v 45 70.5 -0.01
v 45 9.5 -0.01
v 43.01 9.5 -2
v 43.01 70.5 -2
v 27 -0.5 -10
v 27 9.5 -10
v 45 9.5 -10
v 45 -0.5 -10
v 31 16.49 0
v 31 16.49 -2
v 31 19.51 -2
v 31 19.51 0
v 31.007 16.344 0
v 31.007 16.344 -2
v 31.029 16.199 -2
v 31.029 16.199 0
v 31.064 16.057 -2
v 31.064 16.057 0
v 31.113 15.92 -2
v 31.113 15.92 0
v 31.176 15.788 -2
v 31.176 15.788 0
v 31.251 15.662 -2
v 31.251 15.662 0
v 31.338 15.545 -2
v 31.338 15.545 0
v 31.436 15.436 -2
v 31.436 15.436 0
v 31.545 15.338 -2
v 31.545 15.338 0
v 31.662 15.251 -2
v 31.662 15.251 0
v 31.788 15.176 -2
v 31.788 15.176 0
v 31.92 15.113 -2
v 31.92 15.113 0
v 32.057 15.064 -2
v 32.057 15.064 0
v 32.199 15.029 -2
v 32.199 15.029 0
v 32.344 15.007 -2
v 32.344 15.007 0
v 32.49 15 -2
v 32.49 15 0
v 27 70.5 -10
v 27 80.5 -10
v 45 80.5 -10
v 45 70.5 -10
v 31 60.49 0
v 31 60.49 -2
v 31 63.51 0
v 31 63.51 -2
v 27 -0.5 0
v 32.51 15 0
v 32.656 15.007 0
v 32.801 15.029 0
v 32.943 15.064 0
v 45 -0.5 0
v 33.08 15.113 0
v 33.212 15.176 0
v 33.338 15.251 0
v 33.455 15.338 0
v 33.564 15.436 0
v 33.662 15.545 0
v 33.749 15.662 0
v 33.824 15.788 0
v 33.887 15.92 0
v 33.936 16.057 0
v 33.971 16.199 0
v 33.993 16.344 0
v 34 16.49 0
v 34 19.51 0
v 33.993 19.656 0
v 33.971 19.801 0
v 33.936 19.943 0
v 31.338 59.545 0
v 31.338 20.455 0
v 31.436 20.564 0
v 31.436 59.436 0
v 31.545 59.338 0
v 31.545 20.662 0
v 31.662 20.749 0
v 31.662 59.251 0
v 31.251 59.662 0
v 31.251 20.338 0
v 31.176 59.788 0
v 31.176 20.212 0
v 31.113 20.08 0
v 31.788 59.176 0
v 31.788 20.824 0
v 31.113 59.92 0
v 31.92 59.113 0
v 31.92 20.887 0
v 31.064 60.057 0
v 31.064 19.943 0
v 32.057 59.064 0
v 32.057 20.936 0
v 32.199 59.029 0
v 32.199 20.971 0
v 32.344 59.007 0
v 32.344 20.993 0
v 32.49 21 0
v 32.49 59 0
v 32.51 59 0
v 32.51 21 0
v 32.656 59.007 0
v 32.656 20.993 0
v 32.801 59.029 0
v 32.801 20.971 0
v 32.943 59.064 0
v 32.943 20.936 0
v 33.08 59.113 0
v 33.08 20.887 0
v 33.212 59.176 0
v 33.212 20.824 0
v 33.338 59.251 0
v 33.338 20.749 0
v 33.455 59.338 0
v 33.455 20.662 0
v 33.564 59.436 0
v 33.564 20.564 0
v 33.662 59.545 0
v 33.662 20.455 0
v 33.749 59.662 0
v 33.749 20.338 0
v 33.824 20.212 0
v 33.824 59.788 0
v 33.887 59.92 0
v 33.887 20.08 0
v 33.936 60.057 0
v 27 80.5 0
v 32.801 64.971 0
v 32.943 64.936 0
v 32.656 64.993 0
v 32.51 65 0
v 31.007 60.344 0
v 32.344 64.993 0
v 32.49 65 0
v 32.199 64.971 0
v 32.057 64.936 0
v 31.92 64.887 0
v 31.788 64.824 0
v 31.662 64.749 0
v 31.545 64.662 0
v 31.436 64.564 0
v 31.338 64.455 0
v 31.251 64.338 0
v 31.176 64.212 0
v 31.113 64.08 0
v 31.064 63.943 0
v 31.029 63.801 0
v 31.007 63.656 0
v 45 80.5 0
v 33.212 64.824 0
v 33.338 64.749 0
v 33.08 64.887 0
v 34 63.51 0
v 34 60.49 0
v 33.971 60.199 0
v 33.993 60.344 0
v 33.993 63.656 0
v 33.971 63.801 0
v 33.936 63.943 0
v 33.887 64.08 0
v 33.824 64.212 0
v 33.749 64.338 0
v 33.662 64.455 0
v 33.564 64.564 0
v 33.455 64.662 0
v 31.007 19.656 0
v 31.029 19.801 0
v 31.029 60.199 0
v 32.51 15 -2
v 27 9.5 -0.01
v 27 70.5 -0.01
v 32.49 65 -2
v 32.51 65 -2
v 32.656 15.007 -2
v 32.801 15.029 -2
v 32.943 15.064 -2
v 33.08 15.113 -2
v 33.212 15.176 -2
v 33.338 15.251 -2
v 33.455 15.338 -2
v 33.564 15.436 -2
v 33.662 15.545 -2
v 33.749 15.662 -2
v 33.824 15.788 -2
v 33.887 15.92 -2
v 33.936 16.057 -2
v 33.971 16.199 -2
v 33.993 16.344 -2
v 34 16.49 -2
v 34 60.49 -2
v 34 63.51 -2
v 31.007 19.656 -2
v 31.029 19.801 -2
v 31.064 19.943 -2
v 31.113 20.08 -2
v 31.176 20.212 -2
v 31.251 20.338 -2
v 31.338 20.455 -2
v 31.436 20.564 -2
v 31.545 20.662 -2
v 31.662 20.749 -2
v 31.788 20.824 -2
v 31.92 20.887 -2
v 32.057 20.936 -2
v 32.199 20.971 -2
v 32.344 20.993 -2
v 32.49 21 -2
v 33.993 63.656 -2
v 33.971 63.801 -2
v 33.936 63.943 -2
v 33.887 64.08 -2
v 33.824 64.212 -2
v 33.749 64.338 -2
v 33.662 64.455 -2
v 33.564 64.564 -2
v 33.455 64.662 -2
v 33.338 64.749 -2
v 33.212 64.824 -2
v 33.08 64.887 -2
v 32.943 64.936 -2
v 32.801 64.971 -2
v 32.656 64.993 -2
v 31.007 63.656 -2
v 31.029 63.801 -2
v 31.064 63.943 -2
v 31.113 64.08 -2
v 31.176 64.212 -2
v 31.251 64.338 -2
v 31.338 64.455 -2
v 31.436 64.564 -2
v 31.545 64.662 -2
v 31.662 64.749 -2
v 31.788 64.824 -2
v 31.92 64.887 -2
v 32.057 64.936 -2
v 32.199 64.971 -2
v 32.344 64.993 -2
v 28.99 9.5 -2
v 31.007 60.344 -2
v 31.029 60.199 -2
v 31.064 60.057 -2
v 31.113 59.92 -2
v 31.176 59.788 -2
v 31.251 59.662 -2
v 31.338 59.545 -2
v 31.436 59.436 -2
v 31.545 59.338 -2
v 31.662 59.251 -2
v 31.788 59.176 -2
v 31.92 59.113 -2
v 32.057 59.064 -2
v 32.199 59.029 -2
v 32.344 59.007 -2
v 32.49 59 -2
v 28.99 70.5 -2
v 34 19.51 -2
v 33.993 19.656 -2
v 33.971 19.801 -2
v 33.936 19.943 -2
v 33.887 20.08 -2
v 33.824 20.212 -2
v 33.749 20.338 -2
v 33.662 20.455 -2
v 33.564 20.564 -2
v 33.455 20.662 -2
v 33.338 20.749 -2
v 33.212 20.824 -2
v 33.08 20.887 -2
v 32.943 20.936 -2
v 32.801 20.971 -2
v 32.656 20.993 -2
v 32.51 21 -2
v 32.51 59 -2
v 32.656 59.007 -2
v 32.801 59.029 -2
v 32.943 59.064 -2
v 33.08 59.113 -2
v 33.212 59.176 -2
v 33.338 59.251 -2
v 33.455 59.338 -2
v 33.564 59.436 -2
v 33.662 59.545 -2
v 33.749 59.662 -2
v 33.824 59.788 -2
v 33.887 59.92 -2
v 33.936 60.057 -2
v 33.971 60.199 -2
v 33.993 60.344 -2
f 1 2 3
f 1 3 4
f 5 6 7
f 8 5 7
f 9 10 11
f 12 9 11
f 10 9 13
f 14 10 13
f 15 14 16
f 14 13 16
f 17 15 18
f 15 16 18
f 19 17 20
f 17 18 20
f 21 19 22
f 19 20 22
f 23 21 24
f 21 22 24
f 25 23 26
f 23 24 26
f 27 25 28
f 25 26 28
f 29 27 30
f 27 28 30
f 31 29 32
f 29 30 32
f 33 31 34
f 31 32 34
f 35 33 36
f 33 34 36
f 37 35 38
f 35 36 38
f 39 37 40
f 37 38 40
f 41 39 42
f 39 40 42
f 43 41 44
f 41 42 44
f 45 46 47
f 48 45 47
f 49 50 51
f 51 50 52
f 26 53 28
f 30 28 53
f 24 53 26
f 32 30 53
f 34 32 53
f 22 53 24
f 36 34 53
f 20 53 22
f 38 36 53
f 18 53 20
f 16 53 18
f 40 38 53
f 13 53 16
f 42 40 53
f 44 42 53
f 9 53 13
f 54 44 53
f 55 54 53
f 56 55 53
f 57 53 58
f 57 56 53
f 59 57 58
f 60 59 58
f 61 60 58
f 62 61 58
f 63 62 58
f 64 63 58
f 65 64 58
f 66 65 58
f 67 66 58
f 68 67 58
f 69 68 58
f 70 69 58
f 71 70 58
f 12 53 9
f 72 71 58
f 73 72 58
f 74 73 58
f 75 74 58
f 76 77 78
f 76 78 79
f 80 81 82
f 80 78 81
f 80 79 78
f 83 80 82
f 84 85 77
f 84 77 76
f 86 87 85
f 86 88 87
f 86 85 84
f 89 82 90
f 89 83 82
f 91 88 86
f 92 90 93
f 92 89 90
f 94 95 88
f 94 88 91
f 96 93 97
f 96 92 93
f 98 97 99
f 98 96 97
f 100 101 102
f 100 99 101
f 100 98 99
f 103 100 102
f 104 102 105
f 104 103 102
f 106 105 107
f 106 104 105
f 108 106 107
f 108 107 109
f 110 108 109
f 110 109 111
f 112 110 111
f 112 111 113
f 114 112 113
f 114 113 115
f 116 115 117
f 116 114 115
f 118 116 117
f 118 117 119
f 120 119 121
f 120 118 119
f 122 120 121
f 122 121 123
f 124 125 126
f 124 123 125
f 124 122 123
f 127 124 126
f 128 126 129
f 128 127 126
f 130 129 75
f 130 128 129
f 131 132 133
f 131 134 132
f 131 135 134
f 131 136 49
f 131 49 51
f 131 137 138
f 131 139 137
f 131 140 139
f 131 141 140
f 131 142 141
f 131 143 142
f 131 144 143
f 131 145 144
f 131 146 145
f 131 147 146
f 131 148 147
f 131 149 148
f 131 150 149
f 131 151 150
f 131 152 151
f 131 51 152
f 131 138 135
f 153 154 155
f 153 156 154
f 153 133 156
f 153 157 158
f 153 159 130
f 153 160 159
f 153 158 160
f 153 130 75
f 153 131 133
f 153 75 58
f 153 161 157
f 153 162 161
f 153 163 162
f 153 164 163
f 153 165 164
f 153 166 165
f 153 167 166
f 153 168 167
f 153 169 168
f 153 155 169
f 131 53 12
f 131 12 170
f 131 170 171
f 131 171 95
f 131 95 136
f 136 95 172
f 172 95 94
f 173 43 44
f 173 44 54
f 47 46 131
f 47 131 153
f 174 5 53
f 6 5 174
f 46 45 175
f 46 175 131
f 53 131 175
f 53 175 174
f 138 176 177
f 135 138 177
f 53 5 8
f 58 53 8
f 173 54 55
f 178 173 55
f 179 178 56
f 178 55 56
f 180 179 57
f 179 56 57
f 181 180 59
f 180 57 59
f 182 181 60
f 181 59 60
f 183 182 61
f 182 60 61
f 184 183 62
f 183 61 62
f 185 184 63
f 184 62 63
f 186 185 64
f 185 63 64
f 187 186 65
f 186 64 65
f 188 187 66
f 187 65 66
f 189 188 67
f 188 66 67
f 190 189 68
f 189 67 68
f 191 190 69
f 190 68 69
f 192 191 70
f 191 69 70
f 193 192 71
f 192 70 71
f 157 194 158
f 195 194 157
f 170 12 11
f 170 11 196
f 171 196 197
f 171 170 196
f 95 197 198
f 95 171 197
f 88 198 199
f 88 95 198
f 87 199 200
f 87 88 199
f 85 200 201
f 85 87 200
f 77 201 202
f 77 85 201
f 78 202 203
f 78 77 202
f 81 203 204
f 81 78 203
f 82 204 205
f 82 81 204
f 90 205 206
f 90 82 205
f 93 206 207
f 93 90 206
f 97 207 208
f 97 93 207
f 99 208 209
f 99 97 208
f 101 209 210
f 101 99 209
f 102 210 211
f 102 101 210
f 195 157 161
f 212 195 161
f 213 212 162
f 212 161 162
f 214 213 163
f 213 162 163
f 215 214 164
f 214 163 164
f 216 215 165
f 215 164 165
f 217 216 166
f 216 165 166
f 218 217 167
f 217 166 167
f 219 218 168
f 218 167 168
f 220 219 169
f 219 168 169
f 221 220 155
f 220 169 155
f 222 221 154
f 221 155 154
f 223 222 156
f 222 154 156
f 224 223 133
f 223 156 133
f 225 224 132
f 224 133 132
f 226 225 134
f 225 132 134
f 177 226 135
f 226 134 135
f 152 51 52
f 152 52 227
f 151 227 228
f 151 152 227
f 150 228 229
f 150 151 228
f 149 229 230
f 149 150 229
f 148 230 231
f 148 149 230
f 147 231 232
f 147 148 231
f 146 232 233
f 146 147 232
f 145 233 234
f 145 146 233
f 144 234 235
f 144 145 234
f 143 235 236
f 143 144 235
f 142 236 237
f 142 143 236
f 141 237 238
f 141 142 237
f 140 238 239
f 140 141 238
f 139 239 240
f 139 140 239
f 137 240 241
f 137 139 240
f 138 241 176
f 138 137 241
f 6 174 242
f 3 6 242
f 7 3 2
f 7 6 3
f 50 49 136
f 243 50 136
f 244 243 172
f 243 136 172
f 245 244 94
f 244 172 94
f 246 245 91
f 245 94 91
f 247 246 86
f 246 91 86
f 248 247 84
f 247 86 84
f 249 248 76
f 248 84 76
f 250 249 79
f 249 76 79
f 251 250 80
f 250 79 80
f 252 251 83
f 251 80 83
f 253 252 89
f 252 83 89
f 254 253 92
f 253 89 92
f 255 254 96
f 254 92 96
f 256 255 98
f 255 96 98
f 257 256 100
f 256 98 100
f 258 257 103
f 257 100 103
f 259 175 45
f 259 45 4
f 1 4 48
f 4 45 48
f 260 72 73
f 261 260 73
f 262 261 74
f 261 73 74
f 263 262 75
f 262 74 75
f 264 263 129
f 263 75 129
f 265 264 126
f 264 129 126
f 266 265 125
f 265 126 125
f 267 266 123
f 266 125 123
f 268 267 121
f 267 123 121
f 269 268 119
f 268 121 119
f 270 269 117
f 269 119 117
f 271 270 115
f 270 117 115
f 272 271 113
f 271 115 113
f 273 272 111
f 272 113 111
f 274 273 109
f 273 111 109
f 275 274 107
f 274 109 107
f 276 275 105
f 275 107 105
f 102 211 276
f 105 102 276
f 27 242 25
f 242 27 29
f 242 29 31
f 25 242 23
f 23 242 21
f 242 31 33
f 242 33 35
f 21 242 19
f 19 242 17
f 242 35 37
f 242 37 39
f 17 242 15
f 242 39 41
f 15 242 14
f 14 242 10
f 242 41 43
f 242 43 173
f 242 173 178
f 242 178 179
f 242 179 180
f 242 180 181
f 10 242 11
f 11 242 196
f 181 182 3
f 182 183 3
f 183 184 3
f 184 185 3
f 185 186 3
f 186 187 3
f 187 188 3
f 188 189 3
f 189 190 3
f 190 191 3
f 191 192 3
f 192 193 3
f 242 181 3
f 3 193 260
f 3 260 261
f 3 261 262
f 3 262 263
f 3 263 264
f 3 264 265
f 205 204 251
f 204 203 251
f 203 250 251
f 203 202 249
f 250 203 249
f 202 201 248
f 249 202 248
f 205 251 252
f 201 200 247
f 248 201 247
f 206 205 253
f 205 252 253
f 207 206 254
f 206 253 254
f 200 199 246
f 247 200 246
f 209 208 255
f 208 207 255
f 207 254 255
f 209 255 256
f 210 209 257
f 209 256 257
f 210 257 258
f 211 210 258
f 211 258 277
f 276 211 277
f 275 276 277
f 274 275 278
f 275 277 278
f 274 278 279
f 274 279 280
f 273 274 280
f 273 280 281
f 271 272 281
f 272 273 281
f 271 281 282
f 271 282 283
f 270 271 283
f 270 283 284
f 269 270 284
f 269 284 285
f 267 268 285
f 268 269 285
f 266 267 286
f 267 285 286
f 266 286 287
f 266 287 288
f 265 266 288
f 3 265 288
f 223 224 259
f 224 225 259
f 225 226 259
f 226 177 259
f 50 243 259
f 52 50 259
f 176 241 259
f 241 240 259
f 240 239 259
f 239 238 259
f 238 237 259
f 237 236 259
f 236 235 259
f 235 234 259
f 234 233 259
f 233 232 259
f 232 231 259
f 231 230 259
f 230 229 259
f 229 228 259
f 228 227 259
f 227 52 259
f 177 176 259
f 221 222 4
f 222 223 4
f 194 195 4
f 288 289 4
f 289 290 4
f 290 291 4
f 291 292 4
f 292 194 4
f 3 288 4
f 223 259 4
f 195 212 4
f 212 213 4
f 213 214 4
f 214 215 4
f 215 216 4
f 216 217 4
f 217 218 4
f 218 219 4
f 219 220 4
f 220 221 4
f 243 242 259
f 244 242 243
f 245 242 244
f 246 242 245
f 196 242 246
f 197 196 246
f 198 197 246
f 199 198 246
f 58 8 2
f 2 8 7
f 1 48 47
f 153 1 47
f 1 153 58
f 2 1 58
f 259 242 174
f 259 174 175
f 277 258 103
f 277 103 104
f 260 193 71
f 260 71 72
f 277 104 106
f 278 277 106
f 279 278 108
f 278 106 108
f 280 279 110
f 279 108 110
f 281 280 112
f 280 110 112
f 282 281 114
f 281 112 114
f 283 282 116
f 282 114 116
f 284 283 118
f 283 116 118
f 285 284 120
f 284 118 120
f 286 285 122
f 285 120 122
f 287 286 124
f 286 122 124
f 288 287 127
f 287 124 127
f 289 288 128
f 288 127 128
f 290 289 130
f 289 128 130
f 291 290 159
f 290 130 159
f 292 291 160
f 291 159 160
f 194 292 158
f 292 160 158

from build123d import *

# Parameters (mm, degrees)
BOX108_W        = 3
BOX108_H        = 6
BOX108_DEPTH    = 10
FILLET029_R     = 1.49
BOX107_W        = 3
BOX107_H        = 6
BOX107_DEPTH    = 10
FILLET028_R     = 1.49
BOX106_W        = 18
BOX106_H        = 81
BOX106_DEPTH    = 2
BOX105_W        = 18
BOX105_H        = 10
BOX105_DEPTH    = 10
BOX104_W        = 18
BOX104_H        = 10
BOX104_DEPTH    = 10
CHAMFER014_SIZE = 1.99


with BuildPart() as fillet029:
    # Box108 → Box108 (new body)
    with BuildSketch(Plane.XY):
        with Locations((1.5, 3)):
            Rectangle(BOX108_W, BOX108_H)
    extrude(amount=BOX108_DEPTH)

    # Fillet029
    fillet029_edges = [fillet029.edges().sort_by_distance(p)[0] for p in [
        (0, 0, 5),
        (0, 6, 5),
        (3, 0, 5),
        (3, 6, 5),
    ]]
    fillet(fillet029_edges, radius=FILLET029_R)


with BuildPart() as fillet029_1:
    # Fillet029 placement: moved
    add(fillet029.part.moved(Location((31, 59.5, -6))))


with BuildPart() as fusion133:
    # Box107 → Box107 (new body)
    with BuildSketch(Plane.XY):
        with Locations((1.5, 3)):
            Rectangle(BOX107_W, BOX107_H)
    extrude(amount=BOX107_DEPTH)

    # Fillet028
    fillet028_edges = [fusion133.edges().sort_by_distance(p)[0] for p in [
        (0, 0, 5),
        (0, 6, 5),
        (3, 0, 5),
        (3, 6, 5),
    ]]
    fillet(fillet028_edges, radius=FILLET028_R)


with BuildPart() as fusion133_1:
    # Fillet028 placement: moved
    add(fusion133.part.moved(Location((31, 15.5, -6))))

    # Fusion133: union Fillet029
    add(fillet029_1.part)


with BuildPart() as cube078:
    # Box106 → Box106 (new body)
    with BuildSketch(Plane(origin=(27, 0, -2), x_dir=(1, 0, 0), z_dir=(0, 0, 1))):
        with Locations((9, 40.5)):
            Rectangle(BOX106_W, BOX106_H)
    extrude(amount=BOX106_DEPTH)


with BuildPart() as cube077:
    # Box105 → Box105 (new body)
    with BuildSketch(Plane(origin=(27, 71, -10), x_dir=(1, 0, 0), z_dir=(0, 0, 1))):
        with Locations((9, 5)):
            Rectangle(BOX105_W, BOX105_H)
    extrude(amount=BOX105_DEPTH)


with BuildPart() as kipper_frame_missing_part:
    # Box104 → Box104 (new body)
    with BuildSketch(Plane(origin=(27, 0, -10), x_dir=(1, 0, 0), z_dir=(0, 0, 1))):
        with Locations((9, 5)):
            Rectangle(BOX104_W, BOX104_H)
    extrude(amount=BOX104_DEPTH)

    # Fusion132: union Cube078, Cube077
    add(cube078.part)
    add(cube077.part)

    # Cut125: cut Fusion133
    add(fusion133_1.part, mode=Mode.SUBTRACT)

    # Chamfer014
    chamfer014_edges = [kipper_frame_missing_part.edges().sort_by_distance(p)[0] for p in [
        (27, 40.5, -2),
        (45, 40.5, -2),
    ]]
    chamfer(chamfer014_edges, length=CHAMFER014_SIZE)


with BuildPart() as kipper_frame_missing_part_1:
    # Chamfer014 placement: moved
    add(kipper_frame_missing_part.part.moved(Location((0, -0.5, 0))))


solid = kipper_frame_missing_part_1.part
